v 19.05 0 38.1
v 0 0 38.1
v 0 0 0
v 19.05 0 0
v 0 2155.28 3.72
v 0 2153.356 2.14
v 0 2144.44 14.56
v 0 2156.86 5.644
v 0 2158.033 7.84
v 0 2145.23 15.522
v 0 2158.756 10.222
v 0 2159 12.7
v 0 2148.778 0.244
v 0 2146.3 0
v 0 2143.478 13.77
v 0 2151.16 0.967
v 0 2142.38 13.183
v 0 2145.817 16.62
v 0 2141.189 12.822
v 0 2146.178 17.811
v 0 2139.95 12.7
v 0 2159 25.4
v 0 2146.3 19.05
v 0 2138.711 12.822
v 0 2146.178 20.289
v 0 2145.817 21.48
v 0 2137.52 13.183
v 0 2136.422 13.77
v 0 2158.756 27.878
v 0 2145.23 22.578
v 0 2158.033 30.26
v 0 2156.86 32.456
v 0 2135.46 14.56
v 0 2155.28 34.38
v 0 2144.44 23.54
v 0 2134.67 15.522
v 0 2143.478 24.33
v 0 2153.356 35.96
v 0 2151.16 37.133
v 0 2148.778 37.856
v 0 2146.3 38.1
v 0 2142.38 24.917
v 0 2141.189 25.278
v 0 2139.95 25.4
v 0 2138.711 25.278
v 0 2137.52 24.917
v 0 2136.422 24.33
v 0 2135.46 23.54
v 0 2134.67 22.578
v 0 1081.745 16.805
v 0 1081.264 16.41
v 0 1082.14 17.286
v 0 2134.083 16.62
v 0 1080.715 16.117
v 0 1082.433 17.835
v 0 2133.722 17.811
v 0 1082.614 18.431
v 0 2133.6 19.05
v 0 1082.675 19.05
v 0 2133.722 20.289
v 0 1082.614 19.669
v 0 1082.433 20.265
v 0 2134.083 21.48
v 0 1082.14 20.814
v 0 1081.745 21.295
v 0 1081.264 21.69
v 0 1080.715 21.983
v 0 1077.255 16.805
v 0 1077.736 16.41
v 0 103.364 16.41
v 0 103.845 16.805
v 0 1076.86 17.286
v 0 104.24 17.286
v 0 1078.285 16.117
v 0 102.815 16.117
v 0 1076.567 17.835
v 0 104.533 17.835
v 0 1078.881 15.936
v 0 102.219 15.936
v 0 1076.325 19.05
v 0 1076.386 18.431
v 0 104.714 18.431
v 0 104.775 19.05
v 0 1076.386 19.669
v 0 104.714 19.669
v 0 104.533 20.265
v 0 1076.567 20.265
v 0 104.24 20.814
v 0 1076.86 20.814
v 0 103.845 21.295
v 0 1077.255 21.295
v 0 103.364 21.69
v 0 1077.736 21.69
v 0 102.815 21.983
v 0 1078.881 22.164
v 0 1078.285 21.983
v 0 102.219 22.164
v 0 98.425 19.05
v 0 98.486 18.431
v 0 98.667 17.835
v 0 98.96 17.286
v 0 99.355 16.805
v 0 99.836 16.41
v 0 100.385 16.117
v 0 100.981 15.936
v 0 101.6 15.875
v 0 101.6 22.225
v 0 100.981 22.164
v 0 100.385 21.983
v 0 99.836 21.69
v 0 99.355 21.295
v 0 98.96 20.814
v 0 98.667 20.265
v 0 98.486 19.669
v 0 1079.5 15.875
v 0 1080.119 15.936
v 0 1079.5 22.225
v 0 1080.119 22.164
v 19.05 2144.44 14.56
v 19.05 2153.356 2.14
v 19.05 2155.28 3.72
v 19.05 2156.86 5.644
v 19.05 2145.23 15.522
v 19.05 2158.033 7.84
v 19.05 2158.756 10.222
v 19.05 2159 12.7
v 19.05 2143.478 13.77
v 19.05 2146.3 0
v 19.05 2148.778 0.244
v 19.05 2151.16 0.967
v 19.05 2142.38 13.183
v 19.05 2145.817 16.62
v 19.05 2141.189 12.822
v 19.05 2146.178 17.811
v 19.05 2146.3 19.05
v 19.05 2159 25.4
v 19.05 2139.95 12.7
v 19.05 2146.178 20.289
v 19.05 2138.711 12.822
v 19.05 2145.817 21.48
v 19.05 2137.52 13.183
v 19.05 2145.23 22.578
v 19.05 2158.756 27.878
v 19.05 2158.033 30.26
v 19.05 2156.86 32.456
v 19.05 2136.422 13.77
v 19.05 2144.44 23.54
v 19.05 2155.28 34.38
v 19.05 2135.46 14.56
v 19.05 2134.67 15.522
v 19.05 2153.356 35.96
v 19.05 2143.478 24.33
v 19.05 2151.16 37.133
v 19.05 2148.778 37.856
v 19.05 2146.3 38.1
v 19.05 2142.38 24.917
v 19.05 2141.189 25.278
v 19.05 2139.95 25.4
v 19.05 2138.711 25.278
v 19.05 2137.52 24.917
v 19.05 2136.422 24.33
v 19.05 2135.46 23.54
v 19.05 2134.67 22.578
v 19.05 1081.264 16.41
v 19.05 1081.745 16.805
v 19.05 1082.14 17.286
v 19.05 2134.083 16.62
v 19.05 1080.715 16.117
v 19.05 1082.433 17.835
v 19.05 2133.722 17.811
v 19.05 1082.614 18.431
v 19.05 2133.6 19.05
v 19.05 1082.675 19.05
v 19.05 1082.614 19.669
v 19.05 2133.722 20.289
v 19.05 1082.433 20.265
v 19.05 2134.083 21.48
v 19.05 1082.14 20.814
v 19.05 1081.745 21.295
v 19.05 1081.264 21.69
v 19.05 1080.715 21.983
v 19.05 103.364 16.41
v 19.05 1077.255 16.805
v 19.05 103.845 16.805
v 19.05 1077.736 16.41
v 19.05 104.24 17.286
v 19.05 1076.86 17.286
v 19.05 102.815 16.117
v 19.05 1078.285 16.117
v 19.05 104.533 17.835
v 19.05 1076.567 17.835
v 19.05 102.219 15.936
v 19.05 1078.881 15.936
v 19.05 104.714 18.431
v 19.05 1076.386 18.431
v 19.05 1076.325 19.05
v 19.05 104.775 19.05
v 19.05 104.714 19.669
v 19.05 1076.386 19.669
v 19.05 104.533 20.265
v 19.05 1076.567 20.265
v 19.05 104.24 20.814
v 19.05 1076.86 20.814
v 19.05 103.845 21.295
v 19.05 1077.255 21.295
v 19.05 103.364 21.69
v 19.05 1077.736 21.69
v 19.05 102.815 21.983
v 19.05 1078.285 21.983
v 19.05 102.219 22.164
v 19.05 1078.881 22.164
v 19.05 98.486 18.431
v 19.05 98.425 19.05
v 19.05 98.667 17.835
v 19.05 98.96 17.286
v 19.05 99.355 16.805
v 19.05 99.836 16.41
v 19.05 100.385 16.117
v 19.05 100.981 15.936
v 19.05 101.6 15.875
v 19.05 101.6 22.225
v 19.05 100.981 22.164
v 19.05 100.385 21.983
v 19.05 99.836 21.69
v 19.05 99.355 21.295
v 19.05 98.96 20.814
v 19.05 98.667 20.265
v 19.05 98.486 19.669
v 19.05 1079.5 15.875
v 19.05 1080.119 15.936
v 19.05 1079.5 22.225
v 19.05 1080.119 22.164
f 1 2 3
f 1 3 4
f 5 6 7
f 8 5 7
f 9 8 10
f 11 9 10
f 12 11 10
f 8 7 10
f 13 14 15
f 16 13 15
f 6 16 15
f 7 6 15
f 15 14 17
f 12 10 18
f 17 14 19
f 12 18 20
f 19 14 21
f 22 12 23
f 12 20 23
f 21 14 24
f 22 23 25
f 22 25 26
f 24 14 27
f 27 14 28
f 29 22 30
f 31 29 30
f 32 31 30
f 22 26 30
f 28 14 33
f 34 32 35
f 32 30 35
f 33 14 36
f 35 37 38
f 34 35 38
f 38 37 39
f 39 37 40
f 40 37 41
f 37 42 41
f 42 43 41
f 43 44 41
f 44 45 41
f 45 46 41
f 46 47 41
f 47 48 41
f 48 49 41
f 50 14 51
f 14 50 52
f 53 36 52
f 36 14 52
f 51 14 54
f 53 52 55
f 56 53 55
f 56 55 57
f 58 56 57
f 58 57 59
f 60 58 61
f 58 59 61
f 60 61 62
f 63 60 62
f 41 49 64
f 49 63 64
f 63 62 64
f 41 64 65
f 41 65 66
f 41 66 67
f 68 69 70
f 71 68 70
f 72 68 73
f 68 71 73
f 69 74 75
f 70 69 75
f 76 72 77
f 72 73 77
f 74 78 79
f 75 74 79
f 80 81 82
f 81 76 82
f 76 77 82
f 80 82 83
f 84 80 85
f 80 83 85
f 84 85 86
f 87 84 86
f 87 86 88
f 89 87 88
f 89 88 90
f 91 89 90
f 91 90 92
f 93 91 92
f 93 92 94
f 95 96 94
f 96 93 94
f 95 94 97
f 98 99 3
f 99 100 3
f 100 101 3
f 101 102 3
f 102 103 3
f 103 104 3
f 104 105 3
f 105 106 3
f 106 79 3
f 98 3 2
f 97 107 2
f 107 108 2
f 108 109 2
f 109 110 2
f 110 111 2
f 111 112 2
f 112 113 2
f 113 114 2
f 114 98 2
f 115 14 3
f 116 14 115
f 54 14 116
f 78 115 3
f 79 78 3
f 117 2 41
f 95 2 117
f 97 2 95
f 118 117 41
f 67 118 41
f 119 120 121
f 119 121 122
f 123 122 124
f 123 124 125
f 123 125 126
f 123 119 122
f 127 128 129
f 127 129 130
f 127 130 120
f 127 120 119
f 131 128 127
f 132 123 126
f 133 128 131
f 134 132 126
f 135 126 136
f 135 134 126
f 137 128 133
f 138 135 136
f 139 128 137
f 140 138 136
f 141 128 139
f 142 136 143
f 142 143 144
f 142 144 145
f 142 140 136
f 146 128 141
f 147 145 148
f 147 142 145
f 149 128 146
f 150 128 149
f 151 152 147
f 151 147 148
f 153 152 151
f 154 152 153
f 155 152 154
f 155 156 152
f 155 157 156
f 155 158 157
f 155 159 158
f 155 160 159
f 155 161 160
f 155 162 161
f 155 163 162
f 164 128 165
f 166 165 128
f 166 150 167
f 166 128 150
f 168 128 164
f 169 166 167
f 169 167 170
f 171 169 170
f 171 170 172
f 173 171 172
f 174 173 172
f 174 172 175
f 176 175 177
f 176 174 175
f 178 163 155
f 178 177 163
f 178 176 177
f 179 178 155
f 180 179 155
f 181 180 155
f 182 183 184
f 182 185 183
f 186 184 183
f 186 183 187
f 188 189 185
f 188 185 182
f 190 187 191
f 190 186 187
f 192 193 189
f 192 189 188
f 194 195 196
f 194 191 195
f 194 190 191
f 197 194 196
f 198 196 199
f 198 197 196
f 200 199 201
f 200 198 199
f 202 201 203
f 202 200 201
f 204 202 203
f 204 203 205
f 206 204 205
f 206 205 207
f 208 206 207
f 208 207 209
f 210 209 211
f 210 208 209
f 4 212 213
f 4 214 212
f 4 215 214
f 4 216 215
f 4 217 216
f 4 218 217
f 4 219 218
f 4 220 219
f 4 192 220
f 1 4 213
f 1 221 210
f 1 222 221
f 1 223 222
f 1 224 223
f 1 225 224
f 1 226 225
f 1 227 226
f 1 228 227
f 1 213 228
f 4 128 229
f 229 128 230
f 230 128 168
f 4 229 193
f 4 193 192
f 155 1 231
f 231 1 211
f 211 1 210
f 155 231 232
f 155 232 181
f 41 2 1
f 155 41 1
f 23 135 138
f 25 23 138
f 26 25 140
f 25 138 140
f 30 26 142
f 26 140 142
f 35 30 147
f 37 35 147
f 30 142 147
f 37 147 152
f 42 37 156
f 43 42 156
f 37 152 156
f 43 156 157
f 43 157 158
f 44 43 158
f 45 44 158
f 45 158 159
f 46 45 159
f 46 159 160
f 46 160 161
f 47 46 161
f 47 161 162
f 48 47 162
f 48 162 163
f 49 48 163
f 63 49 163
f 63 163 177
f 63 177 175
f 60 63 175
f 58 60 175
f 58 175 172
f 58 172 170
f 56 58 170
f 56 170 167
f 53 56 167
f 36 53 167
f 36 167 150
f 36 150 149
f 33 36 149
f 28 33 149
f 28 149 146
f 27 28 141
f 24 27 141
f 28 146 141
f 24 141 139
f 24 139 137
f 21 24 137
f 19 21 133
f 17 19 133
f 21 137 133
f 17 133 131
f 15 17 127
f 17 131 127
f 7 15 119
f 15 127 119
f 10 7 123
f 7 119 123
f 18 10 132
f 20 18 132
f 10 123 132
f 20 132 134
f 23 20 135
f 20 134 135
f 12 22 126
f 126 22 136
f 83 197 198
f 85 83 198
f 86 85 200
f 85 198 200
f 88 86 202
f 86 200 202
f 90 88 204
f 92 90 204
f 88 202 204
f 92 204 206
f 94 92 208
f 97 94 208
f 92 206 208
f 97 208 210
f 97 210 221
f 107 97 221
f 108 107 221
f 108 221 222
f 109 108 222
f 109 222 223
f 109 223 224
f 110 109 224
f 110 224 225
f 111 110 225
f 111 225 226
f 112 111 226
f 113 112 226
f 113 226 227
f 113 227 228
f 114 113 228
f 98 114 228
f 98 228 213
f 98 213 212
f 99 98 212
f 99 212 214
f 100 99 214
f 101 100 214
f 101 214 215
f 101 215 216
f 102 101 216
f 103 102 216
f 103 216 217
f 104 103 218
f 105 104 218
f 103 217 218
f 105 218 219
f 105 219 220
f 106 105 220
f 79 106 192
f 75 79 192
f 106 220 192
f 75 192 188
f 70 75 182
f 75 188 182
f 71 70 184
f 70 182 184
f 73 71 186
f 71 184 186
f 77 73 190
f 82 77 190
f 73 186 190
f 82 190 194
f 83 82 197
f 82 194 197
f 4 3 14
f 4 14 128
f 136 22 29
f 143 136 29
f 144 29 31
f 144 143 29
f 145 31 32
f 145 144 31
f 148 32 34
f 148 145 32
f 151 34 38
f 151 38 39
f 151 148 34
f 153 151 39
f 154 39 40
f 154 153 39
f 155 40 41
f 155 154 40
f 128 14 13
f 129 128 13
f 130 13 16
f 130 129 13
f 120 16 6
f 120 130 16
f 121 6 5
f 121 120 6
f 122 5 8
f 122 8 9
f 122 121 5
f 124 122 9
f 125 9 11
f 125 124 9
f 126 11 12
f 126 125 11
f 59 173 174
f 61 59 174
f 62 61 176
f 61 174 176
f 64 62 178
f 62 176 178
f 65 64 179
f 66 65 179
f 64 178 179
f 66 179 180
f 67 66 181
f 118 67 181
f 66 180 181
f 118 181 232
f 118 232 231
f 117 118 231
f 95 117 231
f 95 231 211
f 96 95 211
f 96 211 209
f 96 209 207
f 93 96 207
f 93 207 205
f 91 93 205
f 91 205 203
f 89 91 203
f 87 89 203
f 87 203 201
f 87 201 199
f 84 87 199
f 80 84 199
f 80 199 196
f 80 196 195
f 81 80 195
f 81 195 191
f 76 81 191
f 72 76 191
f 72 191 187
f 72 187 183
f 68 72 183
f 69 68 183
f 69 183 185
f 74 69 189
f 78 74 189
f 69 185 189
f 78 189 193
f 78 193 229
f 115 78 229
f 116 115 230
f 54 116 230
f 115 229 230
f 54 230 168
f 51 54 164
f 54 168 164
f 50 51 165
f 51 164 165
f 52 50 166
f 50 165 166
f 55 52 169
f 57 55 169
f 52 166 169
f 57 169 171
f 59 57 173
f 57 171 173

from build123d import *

# Parameters (mm, degrees)
F0_W     = 19.05
F0_H     = 38.1
F1_DEPTH = 2159
F2_R     = 6.35
F2_R_2   = 3.175
F3_DEPTH = 19.051
F4_R     = 12.7


with BuildPart() as f1:
    # F0 (on Front) → F1 (new body)
    with BuildSketch(Plane.XZ):
        with Locations((9.525, 19.05)):
            Rectangle(F0_W, F0_H)
    extrude(amount=-F1_DEPTH)

    # F2 (on face) → F3 (cut, through all)
    with BuildSketch(Plane.YZ.offset(19.05)):
        with Locations((2139.95, 19.05)):
            Circle(F2_R)
        with Locations((1079.5, 19.05)):
            Circle(F2_R_2)
        with Locations((101.6, 19.05)):
            Circle(F2_R_2)
    extrude(amount=-F3_DEPTH, mode=Mode.SUBTRACT)

    # F4
    f4_edges = [f1.edges().sort_by_distance(p)[0] for p in [
        (9.525, 2159, 38.1),
        (9.525, 2159, 0),
    ]]
    fillet(f4_edges, radius=F4_R)


solid = f1.part
